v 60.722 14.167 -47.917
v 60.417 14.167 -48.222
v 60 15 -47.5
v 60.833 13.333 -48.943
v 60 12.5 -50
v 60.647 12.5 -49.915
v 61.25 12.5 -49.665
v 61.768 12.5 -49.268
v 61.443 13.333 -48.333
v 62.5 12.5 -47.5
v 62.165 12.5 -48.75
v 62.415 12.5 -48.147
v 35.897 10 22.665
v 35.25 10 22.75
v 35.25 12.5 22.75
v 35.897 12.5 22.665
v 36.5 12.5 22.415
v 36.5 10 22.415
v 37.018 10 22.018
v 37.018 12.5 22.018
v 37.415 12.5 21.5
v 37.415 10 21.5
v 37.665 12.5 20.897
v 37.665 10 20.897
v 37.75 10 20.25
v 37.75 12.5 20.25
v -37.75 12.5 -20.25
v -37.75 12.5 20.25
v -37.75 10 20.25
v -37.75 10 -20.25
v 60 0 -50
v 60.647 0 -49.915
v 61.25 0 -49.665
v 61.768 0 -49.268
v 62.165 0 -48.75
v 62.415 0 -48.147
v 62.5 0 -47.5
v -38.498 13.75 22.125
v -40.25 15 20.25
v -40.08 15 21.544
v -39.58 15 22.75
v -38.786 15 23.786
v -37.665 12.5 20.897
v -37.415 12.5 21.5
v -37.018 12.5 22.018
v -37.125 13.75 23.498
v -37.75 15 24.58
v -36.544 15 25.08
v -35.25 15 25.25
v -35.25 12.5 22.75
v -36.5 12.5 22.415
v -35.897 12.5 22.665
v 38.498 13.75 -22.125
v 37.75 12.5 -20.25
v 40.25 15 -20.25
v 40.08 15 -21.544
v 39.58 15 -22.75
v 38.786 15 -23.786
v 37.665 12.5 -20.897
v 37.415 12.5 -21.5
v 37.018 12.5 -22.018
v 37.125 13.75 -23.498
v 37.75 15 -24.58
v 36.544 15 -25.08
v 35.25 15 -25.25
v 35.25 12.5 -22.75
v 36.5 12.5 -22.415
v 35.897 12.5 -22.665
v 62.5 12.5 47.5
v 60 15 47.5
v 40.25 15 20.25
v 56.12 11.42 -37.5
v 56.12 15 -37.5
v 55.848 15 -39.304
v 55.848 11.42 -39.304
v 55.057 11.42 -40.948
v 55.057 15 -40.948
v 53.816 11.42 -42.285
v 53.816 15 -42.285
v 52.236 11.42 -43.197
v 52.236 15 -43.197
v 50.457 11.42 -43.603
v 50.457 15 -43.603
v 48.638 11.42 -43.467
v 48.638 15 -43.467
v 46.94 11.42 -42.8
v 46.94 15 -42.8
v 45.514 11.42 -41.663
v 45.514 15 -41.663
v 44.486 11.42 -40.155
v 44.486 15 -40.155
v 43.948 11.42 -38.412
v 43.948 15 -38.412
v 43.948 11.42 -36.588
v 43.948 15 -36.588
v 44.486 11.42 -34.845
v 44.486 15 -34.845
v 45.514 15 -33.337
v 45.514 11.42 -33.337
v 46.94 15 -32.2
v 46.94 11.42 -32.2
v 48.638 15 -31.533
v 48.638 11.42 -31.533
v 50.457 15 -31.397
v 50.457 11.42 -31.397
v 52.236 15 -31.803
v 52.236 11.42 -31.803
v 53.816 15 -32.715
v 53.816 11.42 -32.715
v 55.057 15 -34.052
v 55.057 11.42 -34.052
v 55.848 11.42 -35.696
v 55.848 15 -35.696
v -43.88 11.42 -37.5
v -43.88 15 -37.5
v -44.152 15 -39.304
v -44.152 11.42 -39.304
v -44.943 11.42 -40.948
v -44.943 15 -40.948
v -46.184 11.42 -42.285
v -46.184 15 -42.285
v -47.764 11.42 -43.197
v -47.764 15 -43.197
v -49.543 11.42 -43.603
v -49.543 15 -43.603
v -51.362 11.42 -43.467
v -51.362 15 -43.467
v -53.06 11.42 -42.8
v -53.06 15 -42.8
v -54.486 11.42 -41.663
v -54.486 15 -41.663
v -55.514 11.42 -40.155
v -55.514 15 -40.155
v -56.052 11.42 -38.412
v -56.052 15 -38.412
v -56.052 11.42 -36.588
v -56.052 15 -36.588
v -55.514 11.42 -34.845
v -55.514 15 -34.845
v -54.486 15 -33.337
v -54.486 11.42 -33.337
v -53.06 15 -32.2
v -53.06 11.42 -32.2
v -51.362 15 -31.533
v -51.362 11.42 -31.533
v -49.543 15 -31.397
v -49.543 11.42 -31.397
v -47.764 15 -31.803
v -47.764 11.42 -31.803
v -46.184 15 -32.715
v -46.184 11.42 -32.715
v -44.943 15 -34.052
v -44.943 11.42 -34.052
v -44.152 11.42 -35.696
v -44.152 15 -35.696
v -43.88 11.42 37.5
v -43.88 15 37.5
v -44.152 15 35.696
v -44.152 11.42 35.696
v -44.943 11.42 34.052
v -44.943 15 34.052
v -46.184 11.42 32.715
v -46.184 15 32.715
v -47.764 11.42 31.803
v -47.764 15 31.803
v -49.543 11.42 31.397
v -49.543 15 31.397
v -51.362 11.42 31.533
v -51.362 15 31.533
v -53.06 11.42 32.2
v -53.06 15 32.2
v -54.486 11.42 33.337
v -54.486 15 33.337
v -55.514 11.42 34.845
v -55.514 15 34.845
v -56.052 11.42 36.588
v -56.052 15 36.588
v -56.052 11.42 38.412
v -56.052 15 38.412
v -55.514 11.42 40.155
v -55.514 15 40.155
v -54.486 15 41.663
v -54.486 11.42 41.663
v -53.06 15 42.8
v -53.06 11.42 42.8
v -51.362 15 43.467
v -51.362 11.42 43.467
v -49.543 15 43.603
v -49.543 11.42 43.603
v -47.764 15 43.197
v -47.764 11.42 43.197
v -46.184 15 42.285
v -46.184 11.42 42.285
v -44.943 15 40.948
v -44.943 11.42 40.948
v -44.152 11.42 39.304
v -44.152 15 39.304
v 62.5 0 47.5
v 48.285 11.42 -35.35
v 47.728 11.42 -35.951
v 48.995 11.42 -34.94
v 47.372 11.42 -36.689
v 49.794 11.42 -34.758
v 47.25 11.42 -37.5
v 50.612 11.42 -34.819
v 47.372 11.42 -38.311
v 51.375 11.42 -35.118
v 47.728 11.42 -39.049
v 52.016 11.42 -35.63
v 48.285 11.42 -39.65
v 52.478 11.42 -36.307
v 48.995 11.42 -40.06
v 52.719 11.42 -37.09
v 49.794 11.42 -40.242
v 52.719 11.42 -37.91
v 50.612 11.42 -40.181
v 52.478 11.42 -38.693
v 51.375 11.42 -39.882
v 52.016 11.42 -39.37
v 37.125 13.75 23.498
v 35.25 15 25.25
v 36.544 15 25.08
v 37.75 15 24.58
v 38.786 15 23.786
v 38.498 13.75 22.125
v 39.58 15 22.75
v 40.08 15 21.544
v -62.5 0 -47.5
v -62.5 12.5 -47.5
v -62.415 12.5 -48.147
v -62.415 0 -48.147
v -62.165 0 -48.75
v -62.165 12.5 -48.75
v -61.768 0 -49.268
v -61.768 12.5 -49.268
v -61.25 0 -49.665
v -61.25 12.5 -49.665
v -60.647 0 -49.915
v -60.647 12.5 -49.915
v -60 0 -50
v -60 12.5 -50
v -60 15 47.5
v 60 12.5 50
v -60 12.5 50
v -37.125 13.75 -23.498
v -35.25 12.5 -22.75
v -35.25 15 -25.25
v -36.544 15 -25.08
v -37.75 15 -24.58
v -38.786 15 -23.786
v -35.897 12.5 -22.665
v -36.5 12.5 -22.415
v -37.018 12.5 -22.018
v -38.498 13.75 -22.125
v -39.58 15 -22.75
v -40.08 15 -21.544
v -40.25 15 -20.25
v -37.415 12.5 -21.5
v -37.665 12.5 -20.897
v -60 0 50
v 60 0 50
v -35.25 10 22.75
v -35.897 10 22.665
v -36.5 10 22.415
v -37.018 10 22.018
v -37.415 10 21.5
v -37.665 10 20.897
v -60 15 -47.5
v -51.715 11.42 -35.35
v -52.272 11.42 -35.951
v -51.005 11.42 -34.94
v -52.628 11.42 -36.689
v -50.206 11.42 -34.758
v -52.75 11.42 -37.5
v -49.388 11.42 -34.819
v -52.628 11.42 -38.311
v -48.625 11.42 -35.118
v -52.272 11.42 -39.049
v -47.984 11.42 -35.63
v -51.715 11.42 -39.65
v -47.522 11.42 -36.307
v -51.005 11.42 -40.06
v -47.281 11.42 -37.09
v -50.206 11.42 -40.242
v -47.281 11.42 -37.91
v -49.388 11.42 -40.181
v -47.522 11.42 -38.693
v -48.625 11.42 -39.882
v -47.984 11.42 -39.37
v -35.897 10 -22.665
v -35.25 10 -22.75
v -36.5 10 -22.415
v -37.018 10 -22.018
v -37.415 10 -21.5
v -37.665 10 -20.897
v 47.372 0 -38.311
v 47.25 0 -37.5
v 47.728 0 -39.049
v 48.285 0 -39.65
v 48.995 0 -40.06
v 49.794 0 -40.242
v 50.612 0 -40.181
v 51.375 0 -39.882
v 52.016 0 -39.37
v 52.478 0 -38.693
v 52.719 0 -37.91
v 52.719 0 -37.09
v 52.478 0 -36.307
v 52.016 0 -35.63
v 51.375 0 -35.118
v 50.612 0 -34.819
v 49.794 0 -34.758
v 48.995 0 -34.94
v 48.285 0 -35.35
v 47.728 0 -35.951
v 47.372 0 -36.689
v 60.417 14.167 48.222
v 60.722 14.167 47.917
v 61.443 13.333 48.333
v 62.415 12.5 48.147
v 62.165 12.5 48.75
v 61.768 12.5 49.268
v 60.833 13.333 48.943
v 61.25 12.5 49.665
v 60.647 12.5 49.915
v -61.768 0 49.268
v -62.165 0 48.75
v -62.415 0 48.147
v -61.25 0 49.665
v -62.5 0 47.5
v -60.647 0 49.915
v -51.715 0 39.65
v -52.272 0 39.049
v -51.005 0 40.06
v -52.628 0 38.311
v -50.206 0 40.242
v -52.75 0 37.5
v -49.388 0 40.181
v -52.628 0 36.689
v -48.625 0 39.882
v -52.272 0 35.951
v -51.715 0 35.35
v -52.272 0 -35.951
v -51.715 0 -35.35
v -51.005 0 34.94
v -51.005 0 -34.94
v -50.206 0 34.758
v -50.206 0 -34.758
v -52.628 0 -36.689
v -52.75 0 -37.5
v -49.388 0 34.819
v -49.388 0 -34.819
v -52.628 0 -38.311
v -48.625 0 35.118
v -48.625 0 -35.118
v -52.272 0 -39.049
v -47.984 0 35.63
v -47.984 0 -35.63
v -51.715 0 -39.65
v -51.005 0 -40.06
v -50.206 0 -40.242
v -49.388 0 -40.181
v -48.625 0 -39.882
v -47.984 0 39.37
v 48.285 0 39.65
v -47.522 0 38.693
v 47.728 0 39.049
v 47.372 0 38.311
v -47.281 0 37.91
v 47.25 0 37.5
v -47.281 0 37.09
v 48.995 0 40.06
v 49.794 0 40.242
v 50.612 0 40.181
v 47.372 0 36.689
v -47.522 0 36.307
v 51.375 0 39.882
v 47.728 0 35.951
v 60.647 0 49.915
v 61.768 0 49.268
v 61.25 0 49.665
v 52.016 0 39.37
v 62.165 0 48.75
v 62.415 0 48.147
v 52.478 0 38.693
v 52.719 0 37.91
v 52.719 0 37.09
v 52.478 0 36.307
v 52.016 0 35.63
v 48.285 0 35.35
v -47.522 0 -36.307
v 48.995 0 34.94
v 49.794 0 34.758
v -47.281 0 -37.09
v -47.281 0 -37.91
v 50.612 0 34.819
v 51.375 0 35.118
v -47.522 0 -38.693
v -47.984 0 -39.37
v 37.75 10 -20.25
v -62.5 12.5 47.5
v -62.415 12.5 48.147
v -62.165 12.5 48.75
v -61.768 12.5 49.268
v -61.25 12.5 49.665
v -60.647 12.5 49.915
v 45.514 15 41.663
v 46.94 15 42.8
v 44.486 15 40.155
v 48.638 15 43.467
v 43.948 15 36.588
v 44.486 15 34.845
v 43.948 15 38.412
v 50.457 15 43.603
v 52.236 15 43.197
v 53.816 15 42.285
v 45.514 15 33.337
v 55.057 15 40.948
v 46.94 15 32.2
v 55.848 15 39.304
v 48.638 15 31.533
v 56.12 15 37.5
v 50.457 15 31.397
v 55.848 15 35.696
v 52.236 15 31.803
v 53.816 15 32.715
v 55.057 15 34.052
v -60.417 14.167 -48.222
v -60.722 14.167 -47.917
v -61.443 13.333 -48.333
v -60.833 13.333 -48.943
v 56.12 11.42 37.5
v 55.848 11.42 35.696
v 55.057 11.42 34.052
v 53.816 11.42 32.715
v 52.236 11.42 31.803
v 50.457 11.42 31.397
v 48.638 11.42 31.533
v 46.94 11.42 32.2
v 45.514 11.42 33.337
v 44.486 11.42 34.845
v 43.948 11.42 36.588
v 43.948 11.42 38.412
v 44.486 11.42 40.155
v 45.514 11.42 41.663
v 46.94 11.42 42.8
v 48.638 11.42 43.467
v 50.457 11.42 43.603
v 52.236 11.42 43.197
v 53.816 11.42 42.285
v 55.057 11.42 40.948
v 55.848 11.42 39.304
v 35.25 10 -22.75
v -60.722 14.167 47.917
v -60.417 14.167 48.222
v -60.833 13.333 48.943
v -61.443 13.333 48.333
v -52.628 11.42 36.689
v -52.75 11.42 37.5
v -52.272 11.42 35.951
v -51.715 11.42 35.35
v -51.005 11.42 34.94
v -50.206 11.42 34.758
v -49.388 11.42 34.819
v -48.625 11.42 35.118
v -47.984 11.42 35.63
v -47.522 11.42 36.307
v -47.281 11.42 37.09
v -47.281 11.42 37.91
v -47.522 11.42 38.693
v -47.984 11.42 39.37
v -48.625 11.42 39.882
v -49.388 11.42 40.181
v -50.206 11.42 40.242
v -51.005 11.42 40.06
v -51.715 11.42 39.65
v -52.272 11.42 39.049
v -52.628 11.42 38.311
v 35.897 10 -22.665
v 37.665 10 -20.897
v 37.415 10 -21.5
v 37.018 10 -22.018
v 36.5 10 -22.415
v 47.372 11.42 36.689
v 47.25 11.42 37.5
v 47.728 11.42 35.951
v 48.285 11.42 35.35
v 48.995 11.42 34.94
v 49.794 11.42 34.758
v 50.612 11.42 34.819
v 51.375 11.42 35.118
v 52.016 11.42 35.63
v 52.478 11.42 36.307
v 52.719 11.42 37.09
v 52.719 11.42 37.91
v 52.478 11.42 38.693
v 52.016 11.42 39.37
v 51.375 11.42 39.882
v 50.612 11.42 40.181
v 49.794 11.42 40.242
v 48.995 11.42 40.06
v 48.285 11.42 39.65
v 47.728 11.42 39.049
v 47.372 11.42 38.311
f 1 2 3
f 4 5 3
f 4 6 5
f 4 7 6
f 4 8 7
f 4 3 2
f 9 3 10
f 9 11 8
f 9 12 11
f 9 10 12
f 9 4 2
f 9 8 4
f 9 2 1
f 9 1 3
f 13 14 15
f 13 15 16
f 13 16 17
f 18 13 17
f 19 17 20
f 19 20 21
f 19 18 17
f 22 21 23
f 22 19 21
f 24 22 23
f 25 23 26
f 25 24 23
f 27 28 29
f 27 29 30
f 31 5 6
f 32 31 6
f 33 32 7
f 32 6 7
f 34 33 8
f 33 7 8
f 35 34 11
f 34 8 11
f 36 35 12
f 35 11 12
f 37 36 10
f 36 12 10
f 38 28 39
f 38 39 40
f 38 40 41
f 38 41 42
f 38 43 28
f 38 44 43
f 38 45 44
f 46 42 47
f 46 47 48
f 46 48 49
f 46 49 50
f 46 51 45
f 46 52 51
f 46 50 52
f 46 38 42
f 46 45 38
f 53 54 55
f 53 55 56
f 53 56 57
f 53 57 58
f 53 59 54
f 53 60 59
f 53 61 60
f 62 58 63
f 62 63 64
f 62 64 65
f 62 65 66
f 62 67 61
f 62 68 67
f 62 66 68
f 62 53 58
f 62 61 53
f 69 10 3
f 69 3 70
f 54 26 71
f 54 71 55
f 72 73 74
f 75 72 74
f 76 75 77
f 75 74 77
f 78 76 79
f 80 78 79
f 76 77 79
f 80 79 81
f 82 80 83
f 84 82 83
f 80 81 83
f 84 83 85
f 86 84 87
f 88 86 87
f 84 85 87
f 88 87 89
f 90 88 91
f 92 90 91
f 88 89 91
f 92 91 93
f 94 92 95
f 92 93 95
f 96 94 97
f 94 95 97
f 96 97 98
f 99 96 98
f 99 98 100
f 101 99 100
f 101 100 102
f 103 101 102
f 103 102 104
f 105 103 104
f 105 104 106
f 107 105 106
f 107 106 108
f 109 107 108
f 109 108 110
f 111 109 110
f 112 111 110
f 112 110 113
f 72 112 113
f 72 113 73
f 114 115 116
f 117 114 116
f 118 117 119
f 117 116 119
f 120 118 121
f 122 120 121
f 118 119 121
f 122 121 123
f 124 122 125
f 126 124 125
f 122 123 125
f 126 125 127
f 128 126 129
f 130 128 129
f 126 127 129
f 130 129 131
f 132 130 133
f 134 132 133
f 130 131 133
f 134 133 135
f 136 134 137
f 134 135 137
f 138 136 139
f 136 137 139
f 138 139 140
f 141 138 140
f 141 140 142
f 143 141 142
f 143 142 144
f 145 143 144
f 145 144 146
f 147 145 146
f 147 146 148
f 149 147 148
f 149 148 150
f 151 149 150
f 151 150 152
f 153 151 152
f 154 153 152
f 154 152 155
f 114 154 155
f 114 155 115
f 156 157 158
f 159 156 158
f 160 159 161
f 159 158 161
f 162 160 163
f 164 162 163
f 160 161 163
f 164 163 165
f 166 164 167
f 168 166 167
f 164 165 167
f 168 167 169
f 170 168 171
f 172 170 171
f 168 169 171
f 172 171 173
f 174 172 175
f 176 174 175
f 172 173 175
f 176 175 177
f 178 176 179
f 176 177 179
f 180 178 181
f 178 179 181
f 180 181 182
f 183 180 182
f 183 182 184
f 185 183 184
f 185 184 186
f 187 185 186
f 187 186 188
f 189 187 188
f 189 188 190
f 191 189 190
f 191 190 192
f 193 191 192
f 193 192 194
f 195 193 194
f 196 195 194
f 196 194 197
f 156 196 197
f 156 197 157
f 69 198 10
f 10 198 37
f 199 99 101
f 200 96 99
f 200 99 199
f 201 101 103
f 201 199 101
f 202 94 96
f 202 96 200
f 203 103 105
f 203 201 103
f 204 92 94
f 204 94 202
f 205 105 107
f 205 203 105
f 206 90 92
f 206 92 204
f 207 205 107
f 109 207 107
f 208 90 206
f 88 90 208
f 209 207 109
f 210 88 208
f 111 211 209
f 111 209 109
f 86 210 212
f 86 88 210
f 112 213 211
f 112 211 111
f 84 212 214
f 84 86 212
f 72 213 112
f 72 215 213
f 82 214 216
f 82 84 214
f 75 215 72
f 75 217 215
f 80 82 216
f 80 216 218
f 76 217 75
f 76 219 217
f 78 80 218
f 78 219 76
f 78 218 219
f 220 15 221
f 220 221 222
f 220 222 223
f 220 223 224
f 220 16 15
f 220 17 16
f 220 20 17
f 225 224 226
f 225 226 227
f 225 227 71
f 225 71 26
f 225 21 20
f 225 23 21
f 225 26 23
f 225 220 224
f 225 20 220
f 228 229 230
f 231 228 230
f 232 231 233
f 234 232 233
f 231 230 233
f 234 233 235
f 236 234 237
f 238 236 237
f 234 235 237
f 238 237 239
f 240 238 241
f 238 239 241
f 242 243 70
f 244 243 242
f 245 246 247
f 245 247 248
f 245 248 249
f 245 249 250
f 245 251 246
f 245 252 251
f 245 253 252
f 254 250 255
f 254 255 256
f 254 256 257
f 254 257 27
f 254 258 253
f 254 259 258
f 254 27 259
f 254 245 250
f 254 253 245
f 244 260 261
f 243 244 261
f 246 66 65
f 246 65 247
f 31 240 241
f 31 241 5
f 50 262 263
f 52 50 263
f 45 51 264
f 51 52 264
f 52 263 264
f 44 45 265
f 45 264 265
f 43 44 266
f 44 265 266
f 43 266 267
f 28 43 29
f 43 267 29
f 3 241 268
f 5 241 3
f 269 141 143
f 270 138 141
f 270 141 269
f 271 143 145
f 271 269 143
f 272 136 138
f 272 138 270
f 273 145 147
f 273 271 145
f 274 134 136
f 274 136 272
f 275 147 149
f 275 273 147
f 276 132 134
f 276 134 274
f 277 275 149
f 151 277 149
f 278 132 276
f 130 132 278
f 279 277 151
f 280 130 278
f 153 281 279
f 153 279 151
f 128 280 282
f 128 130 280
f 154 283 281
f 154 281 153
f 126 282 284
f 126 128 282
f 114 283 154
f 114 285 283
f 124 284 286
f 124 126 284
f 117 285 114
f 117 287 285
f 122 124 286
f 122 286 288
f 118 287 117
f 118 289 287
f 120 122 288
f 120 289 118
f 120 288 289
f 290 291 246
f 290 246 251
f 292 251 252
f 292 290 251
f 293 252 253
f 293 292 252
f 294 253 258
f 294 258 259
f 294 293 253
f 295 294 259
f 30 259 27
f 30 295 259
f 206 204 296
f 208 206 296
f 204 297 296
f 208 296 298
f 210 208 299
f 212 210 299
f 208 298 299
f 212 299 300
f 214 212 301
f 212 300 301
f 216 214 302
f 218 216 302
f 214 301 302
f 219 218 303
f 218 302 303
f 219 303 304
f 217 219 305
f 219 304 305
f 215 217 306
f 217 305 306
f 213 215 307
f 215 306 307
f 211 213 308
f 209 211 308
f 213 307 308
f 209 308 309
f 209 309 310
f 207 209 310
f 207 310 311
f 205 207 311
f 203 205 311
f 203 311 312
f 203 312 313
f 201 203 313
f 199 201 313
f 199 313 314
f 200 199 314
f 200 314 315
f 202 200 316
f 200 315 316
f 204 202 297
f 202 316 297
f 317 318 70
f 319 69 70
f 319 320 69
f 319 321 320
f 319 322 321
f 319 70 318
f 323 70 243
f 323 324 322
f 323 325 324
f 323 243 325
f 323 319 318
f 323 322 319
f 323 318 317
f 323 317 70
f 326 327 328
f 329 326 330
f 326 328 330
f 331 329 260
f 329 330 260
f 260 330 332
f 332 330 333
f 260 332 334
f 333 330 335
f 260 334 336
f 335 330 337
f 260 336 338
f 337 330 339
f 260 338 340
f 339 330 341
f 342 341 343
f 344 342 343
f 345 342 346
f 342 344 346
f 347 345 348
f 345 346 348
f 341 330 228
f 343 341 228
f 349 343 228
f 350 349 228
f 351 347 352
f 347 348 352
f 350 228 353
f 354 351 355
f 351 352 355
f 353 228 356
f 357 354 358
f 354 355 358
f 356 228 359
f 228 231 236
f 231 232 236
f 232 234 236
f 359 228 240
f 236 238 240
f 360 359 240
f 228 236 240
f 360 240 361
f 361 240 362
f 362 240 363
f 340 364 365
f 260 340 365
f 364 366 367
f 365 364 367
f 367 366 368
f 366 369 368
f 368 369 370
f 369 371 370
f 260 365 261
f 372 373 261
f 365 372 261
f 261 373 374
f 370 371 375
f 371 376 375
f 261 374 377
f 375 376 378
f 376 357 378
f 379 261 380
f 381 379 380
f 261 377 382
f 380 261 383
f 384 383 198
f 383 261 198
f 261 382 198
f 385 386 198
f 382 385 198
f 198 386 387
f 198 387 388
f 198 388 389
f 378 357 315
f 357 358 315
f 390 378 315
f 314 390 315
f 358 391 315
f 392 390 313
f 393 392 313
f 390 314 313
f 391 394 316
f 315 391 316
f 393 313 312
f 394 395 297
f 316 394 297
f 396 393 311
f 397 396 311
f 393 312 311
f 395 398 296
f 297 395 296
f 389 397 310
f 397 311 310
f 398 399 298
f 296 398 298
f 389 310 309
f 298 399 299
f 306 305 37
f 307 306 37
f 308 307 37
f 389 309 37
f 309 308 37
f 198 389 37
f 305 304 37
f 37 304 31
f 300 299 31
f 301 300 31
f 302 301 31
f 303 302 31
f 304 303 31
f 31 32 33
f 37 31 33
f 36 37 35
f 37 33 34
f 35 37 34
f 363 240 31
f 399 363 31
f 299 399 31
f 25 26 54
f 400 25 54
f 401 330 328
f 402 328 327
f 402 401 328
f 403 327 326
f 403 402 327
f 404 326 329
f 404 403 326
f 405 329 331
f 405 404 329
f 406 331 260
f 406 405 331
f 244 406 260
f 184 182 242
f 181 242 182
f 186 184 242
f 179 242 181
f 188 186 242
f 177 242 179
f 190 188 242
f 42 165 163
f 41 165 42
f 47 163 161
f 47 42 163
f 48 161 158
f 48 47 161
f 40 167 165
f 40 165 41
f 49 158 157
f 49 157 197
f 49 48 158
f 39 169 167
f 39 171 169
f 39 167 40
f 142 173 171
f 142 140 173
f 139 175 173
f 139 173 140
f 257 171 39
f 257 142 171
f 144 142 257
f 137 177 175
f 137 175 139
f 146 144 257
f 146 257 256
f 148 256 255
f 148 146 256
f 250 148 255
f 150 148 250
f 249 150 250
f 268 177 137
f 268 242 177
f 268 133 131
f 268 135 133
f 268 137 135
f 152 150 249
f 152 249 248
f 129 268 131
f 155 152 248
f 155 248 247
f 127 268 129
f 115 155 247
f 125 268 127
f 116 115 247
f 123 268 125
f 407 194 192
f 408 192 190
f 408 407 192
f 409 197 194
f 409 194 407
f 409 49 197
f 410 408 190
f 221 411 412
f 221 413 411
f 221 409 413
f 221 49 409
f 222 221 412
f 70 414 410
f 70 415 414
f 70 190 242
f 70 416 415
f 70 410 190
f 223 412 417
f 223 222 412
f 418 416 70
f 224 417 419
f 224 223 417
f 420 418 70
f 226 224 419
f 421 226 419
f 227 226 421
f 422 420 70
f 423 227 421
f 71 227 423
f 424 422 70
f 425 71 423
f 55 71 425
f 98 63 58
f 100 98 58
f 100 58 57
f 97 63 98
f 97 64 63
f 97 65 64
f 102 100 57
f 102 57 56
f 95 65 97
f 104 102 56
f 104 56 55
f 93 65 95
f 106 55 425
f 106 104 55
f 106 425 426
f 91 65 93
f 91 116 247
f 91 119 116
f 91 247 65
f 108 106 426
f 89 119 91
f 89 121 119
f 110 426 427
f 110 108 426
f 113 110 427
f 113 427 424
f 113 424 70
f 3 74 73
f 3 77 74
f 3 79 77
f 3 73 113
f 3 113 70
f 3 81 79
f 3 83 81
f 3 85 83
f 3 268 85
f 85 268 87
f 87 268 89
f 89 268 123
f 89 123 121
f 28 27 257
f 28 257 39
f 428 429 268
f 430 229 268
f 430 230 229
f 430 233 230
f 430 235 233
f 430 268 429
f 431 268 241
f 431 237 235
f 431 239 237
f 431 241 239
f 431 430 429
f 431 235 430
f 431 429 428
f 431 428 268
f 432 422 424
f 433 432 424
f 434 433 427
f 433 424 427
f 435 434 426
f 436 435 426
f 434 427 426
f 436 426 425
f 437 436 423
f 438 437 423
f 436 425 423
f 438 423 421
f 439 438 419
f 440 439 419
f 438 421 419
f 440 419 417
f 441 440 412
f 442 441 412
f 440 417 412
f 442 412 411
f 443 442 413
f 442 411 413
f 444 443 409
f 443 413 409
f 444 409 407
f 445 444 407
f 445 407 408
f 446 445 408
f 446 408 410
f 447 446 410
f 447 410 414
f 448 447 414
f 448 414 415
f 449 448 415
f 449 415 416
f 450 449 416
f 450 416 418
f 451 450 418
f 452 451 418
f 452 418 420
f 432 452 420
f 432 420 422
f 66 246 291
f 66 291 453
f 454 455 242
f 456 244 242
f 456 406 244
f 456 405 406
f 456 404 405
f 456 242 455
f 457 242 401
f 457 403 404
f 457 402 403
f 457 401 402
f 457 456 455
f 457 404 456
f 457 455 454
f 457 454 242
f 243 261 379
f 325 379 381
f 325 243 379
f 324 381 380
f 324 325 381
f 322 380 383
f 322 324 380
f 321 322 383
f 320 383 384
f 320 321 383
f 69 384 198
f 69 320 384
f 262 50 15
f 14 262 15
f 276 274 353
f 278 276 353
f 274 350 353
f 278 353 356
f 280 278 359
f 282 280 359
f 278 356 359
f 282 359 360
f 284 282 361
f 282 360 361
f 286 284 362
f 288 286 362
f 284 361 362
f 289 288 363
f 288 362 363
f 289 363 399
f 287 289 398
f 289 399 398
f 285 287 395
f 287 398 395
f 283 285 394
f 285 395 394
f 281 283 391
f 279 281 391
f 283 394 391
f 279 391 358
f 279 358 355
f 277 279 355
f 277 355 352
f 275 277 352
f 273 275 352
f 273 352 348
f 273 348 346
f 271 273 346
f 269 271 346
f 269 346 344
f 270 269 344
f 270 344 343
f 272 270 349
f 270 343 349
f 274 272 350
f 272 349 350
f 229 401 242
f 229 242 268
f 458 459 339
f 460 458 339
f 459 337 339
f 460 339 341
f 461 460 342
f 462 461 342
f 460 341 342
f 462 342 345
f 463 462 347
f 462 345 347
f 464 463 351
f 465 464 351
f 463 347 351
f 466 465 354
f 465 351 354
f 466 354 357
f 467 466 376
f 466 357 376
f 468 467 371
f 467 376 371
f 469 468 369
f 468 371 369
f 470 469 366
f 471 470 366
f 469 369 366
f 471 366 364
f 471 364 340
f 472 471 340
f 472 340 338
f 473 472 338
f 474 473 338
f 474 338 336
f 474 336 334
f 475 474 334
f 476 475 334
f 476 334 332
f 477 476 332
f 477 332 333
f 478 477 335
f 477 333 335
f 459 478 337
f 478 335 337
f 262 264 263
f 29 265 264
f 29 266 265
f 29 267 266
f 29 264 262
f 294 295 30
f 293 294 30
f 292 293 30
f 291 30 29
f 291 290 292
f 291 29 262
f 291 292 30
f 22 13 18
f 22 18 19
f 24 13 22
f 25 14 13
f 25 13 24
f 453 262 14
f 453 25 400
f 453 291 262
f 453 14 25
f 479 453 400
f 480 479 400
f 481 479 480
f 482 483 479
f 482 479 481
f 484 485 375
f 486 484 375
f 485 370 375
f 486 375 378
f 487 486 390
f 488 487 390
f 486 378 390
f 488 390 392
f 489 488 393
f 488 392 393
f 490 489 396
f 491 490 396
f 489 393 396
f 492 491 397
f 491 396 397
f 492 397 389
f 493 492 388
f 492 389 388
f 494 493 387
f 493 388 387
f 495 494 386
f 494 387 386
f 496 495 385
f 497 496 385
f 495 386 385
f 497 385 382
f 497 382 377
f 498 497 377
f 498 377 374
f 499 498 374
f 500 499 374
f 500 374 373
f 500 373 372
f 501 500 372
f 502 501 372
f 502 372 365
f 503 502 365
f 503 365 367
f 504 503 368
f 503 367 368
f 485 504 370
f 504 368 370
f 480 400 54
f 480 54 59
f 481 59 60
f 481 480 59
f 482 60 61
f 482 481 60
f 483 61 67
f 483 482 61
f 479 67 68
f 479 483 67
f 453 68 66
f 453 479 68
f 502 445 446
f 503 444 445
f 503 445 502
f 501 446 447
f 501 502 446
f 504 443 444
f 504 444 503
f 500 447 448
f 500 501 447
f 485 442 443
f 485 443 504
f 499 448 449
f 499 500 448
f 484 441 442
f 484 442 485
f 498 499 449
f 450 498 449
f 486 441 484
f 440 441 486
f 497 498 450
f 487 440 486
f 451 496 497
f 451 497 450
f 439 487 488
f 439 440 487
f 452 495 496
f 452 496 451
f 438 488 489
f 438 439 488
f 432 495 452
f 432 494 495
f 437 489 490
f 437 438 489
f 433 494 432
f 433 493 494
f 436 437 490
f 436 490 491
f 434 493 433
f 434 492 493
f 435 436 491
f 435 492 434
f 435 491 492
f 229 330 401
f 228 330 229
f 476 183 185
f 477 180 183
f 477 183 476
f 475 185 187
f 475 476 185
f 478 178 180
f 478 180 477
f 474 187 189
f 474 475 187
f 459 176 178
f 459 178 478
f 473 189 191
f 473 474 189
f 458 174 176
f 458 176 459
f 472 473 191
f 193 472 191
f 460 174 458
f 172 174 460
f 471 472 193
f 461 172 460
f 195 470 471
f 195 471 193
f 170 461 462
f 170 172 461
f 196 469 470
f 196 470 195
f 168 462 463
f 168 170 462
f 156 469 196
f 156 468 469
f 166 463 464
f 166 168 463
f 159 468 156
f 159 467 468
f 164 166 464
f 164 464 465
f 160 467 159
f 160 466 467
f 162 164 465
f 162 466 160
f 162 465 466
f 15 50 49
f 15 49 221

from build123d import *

# Parameters (mm, degrees)
SKETCH1_W                               = 125
SKETCH1_H                               = 100
BOSS_EXTRUDE1_DEPTH                     = 15
SKETCH2_W                               = 75.5
SKETCH2_H                               = 45.5
CUT_EXTRUDE1_DEPTH                      = 5
FILLET1_R                               = 2.5
CHAMFER2_SIZE                           = 2.5
CBORE_FOR_M5_HEX_HEAD_BOLT1_D           = 5.5
CBORE_FOR_M5_HEX_HEAD_BOLT1_CBORE_D     = 12.24
CBORE_FOR_M5_HEX_HEAD_BOLT1_CBORE_DEPTH = 3.58
LPATTERN2_COUNT                         = 2
LPATTERN2_PITCH                         = 75
LPATTERN2_COUNT_DIR2                    = 2
LPATTERN2_PITCH_DIR2                    = 100
FILLET2_R                               = 2.5
CHAMFER3_SIZE                           = 2.5


with BuildPart() as part:
    # Sketch1 → Boss-Extrude1 (new body)
    with BuildSketch(Plane(origin=(0, 0, 0), x_dir=(1, 0, 0), z_dir=(0, 1, 0))):
        Rectangle(SKETCH1_W, SKETCH1_H)
    extrude(amount=BOSS_EXTRUDE1_DEPTH)

    # Sketch2 → Cut-Extrude1 (cut)
    with BuildSketch(Plane(origin=(0, 15, 0), x_dir=(1, 0, 0), z_dir=(0, 1, 0))):
        Rectangle(SKETCH2_W, SKETCH2_H)
    extrude(amount=-CUT_EXTRUDE1_DEPTH, mode=Mode.SUBTRACT)

    # Fillet1
    fillet1_edges = [part.edges().sort_by_distance(p)[0] for p in [
        (37.75, 12.5, -22.75),
        (37.75, 12.5, 22.75),
        (-37.75, 12.5, 22.75),
        (-37.75, 12.5, -22.75),
    ]]
    fillet(fillet1_edges, radius=FILLET1_R)

    # Chamfer2
    chamfer2_edges = [part.edges().sort_by_distance(p)[0] for p in [
        (0, 15, 22.75),
        (-37.75, 15, 0),
        (37.75, 15, 0),
        (0, 15, -22.75),
        (-37.017766953, 15, 22.017766953),
        (37.017766953, 15, 22.017766953),
        (37.017766953, 15, -22.017766953),
        (-37.017766953, 15, -22.017766953),
    ]]
    chamfer(chamfer2_edges, length=CHAMFER2_SIZE)

    # CBORE for M5 Hex Head Bolt1 (through all)
    with Locations(Plane(origin=(0, 15, 0), x_dir=(1, 0, 0), z_dir=(0, 1, 0))):
        with Locations((50, 37.5)):
            cbore_for_m5_hex_head_bolt1 = CounterBoreHole(CBORE_FOR_M5_HEX_HEAD_BOLT1_D / 2, CBORE_FOR_M5_HEX_HEAD_BOLT1_CBORE_D / 2, CBORE_FOR_M5_HEX_HEAD_BOLT1_CBORE_DEPTH)

    # LPattern2: CBORE for M5 Hex Head Bolt1 2 × 2
    with Locations(*[(-j * LPATTERN2_PITCH_DIR2, 0, i * LPATTERN2_PITCH) for i in range(LPATTERN2_COUNT) for j in range(LPATTERN2_COUNT_DIR2) if (i, j) != (0, 0)]):
        add(cbore_for_m5_hex_head_bolt1, mode=Mode.SUBTRACT)

    # Fillet2
    fillet2_edges = [part.edges().sort_by_distance(p)[0] for p in [
        (62.5, 7.5, 50),
        (-62.5, 7.5, 50),
        (-62.5, 7.5, -50),
        (62.5, 7.5, -50),
    ]]
    fillet(fillet2_edges, radius=FILLET2_R)

    # Chamfer3
    chamfer3_edges = [part.edges().sort_by_distance(p)[0] for p in [
        (-62.5, 15, 0),
        (0, 15, -50),
        (62.5, 15, 0),
        (0, 15, 50),
        (-61.767766953, 15, 49.267766953),
        (61.767766953, 15, 49.267766953),
        (61.767766953, 15, -49.267766953),
        (-61.767766953, 15, -49.267766953),
    ]]
    chamfer(chamfer3_edges, length=CHAMFER3_SIZE - 0.0001)  # a hair under: the kernel refuses the full size


solid = part.part
